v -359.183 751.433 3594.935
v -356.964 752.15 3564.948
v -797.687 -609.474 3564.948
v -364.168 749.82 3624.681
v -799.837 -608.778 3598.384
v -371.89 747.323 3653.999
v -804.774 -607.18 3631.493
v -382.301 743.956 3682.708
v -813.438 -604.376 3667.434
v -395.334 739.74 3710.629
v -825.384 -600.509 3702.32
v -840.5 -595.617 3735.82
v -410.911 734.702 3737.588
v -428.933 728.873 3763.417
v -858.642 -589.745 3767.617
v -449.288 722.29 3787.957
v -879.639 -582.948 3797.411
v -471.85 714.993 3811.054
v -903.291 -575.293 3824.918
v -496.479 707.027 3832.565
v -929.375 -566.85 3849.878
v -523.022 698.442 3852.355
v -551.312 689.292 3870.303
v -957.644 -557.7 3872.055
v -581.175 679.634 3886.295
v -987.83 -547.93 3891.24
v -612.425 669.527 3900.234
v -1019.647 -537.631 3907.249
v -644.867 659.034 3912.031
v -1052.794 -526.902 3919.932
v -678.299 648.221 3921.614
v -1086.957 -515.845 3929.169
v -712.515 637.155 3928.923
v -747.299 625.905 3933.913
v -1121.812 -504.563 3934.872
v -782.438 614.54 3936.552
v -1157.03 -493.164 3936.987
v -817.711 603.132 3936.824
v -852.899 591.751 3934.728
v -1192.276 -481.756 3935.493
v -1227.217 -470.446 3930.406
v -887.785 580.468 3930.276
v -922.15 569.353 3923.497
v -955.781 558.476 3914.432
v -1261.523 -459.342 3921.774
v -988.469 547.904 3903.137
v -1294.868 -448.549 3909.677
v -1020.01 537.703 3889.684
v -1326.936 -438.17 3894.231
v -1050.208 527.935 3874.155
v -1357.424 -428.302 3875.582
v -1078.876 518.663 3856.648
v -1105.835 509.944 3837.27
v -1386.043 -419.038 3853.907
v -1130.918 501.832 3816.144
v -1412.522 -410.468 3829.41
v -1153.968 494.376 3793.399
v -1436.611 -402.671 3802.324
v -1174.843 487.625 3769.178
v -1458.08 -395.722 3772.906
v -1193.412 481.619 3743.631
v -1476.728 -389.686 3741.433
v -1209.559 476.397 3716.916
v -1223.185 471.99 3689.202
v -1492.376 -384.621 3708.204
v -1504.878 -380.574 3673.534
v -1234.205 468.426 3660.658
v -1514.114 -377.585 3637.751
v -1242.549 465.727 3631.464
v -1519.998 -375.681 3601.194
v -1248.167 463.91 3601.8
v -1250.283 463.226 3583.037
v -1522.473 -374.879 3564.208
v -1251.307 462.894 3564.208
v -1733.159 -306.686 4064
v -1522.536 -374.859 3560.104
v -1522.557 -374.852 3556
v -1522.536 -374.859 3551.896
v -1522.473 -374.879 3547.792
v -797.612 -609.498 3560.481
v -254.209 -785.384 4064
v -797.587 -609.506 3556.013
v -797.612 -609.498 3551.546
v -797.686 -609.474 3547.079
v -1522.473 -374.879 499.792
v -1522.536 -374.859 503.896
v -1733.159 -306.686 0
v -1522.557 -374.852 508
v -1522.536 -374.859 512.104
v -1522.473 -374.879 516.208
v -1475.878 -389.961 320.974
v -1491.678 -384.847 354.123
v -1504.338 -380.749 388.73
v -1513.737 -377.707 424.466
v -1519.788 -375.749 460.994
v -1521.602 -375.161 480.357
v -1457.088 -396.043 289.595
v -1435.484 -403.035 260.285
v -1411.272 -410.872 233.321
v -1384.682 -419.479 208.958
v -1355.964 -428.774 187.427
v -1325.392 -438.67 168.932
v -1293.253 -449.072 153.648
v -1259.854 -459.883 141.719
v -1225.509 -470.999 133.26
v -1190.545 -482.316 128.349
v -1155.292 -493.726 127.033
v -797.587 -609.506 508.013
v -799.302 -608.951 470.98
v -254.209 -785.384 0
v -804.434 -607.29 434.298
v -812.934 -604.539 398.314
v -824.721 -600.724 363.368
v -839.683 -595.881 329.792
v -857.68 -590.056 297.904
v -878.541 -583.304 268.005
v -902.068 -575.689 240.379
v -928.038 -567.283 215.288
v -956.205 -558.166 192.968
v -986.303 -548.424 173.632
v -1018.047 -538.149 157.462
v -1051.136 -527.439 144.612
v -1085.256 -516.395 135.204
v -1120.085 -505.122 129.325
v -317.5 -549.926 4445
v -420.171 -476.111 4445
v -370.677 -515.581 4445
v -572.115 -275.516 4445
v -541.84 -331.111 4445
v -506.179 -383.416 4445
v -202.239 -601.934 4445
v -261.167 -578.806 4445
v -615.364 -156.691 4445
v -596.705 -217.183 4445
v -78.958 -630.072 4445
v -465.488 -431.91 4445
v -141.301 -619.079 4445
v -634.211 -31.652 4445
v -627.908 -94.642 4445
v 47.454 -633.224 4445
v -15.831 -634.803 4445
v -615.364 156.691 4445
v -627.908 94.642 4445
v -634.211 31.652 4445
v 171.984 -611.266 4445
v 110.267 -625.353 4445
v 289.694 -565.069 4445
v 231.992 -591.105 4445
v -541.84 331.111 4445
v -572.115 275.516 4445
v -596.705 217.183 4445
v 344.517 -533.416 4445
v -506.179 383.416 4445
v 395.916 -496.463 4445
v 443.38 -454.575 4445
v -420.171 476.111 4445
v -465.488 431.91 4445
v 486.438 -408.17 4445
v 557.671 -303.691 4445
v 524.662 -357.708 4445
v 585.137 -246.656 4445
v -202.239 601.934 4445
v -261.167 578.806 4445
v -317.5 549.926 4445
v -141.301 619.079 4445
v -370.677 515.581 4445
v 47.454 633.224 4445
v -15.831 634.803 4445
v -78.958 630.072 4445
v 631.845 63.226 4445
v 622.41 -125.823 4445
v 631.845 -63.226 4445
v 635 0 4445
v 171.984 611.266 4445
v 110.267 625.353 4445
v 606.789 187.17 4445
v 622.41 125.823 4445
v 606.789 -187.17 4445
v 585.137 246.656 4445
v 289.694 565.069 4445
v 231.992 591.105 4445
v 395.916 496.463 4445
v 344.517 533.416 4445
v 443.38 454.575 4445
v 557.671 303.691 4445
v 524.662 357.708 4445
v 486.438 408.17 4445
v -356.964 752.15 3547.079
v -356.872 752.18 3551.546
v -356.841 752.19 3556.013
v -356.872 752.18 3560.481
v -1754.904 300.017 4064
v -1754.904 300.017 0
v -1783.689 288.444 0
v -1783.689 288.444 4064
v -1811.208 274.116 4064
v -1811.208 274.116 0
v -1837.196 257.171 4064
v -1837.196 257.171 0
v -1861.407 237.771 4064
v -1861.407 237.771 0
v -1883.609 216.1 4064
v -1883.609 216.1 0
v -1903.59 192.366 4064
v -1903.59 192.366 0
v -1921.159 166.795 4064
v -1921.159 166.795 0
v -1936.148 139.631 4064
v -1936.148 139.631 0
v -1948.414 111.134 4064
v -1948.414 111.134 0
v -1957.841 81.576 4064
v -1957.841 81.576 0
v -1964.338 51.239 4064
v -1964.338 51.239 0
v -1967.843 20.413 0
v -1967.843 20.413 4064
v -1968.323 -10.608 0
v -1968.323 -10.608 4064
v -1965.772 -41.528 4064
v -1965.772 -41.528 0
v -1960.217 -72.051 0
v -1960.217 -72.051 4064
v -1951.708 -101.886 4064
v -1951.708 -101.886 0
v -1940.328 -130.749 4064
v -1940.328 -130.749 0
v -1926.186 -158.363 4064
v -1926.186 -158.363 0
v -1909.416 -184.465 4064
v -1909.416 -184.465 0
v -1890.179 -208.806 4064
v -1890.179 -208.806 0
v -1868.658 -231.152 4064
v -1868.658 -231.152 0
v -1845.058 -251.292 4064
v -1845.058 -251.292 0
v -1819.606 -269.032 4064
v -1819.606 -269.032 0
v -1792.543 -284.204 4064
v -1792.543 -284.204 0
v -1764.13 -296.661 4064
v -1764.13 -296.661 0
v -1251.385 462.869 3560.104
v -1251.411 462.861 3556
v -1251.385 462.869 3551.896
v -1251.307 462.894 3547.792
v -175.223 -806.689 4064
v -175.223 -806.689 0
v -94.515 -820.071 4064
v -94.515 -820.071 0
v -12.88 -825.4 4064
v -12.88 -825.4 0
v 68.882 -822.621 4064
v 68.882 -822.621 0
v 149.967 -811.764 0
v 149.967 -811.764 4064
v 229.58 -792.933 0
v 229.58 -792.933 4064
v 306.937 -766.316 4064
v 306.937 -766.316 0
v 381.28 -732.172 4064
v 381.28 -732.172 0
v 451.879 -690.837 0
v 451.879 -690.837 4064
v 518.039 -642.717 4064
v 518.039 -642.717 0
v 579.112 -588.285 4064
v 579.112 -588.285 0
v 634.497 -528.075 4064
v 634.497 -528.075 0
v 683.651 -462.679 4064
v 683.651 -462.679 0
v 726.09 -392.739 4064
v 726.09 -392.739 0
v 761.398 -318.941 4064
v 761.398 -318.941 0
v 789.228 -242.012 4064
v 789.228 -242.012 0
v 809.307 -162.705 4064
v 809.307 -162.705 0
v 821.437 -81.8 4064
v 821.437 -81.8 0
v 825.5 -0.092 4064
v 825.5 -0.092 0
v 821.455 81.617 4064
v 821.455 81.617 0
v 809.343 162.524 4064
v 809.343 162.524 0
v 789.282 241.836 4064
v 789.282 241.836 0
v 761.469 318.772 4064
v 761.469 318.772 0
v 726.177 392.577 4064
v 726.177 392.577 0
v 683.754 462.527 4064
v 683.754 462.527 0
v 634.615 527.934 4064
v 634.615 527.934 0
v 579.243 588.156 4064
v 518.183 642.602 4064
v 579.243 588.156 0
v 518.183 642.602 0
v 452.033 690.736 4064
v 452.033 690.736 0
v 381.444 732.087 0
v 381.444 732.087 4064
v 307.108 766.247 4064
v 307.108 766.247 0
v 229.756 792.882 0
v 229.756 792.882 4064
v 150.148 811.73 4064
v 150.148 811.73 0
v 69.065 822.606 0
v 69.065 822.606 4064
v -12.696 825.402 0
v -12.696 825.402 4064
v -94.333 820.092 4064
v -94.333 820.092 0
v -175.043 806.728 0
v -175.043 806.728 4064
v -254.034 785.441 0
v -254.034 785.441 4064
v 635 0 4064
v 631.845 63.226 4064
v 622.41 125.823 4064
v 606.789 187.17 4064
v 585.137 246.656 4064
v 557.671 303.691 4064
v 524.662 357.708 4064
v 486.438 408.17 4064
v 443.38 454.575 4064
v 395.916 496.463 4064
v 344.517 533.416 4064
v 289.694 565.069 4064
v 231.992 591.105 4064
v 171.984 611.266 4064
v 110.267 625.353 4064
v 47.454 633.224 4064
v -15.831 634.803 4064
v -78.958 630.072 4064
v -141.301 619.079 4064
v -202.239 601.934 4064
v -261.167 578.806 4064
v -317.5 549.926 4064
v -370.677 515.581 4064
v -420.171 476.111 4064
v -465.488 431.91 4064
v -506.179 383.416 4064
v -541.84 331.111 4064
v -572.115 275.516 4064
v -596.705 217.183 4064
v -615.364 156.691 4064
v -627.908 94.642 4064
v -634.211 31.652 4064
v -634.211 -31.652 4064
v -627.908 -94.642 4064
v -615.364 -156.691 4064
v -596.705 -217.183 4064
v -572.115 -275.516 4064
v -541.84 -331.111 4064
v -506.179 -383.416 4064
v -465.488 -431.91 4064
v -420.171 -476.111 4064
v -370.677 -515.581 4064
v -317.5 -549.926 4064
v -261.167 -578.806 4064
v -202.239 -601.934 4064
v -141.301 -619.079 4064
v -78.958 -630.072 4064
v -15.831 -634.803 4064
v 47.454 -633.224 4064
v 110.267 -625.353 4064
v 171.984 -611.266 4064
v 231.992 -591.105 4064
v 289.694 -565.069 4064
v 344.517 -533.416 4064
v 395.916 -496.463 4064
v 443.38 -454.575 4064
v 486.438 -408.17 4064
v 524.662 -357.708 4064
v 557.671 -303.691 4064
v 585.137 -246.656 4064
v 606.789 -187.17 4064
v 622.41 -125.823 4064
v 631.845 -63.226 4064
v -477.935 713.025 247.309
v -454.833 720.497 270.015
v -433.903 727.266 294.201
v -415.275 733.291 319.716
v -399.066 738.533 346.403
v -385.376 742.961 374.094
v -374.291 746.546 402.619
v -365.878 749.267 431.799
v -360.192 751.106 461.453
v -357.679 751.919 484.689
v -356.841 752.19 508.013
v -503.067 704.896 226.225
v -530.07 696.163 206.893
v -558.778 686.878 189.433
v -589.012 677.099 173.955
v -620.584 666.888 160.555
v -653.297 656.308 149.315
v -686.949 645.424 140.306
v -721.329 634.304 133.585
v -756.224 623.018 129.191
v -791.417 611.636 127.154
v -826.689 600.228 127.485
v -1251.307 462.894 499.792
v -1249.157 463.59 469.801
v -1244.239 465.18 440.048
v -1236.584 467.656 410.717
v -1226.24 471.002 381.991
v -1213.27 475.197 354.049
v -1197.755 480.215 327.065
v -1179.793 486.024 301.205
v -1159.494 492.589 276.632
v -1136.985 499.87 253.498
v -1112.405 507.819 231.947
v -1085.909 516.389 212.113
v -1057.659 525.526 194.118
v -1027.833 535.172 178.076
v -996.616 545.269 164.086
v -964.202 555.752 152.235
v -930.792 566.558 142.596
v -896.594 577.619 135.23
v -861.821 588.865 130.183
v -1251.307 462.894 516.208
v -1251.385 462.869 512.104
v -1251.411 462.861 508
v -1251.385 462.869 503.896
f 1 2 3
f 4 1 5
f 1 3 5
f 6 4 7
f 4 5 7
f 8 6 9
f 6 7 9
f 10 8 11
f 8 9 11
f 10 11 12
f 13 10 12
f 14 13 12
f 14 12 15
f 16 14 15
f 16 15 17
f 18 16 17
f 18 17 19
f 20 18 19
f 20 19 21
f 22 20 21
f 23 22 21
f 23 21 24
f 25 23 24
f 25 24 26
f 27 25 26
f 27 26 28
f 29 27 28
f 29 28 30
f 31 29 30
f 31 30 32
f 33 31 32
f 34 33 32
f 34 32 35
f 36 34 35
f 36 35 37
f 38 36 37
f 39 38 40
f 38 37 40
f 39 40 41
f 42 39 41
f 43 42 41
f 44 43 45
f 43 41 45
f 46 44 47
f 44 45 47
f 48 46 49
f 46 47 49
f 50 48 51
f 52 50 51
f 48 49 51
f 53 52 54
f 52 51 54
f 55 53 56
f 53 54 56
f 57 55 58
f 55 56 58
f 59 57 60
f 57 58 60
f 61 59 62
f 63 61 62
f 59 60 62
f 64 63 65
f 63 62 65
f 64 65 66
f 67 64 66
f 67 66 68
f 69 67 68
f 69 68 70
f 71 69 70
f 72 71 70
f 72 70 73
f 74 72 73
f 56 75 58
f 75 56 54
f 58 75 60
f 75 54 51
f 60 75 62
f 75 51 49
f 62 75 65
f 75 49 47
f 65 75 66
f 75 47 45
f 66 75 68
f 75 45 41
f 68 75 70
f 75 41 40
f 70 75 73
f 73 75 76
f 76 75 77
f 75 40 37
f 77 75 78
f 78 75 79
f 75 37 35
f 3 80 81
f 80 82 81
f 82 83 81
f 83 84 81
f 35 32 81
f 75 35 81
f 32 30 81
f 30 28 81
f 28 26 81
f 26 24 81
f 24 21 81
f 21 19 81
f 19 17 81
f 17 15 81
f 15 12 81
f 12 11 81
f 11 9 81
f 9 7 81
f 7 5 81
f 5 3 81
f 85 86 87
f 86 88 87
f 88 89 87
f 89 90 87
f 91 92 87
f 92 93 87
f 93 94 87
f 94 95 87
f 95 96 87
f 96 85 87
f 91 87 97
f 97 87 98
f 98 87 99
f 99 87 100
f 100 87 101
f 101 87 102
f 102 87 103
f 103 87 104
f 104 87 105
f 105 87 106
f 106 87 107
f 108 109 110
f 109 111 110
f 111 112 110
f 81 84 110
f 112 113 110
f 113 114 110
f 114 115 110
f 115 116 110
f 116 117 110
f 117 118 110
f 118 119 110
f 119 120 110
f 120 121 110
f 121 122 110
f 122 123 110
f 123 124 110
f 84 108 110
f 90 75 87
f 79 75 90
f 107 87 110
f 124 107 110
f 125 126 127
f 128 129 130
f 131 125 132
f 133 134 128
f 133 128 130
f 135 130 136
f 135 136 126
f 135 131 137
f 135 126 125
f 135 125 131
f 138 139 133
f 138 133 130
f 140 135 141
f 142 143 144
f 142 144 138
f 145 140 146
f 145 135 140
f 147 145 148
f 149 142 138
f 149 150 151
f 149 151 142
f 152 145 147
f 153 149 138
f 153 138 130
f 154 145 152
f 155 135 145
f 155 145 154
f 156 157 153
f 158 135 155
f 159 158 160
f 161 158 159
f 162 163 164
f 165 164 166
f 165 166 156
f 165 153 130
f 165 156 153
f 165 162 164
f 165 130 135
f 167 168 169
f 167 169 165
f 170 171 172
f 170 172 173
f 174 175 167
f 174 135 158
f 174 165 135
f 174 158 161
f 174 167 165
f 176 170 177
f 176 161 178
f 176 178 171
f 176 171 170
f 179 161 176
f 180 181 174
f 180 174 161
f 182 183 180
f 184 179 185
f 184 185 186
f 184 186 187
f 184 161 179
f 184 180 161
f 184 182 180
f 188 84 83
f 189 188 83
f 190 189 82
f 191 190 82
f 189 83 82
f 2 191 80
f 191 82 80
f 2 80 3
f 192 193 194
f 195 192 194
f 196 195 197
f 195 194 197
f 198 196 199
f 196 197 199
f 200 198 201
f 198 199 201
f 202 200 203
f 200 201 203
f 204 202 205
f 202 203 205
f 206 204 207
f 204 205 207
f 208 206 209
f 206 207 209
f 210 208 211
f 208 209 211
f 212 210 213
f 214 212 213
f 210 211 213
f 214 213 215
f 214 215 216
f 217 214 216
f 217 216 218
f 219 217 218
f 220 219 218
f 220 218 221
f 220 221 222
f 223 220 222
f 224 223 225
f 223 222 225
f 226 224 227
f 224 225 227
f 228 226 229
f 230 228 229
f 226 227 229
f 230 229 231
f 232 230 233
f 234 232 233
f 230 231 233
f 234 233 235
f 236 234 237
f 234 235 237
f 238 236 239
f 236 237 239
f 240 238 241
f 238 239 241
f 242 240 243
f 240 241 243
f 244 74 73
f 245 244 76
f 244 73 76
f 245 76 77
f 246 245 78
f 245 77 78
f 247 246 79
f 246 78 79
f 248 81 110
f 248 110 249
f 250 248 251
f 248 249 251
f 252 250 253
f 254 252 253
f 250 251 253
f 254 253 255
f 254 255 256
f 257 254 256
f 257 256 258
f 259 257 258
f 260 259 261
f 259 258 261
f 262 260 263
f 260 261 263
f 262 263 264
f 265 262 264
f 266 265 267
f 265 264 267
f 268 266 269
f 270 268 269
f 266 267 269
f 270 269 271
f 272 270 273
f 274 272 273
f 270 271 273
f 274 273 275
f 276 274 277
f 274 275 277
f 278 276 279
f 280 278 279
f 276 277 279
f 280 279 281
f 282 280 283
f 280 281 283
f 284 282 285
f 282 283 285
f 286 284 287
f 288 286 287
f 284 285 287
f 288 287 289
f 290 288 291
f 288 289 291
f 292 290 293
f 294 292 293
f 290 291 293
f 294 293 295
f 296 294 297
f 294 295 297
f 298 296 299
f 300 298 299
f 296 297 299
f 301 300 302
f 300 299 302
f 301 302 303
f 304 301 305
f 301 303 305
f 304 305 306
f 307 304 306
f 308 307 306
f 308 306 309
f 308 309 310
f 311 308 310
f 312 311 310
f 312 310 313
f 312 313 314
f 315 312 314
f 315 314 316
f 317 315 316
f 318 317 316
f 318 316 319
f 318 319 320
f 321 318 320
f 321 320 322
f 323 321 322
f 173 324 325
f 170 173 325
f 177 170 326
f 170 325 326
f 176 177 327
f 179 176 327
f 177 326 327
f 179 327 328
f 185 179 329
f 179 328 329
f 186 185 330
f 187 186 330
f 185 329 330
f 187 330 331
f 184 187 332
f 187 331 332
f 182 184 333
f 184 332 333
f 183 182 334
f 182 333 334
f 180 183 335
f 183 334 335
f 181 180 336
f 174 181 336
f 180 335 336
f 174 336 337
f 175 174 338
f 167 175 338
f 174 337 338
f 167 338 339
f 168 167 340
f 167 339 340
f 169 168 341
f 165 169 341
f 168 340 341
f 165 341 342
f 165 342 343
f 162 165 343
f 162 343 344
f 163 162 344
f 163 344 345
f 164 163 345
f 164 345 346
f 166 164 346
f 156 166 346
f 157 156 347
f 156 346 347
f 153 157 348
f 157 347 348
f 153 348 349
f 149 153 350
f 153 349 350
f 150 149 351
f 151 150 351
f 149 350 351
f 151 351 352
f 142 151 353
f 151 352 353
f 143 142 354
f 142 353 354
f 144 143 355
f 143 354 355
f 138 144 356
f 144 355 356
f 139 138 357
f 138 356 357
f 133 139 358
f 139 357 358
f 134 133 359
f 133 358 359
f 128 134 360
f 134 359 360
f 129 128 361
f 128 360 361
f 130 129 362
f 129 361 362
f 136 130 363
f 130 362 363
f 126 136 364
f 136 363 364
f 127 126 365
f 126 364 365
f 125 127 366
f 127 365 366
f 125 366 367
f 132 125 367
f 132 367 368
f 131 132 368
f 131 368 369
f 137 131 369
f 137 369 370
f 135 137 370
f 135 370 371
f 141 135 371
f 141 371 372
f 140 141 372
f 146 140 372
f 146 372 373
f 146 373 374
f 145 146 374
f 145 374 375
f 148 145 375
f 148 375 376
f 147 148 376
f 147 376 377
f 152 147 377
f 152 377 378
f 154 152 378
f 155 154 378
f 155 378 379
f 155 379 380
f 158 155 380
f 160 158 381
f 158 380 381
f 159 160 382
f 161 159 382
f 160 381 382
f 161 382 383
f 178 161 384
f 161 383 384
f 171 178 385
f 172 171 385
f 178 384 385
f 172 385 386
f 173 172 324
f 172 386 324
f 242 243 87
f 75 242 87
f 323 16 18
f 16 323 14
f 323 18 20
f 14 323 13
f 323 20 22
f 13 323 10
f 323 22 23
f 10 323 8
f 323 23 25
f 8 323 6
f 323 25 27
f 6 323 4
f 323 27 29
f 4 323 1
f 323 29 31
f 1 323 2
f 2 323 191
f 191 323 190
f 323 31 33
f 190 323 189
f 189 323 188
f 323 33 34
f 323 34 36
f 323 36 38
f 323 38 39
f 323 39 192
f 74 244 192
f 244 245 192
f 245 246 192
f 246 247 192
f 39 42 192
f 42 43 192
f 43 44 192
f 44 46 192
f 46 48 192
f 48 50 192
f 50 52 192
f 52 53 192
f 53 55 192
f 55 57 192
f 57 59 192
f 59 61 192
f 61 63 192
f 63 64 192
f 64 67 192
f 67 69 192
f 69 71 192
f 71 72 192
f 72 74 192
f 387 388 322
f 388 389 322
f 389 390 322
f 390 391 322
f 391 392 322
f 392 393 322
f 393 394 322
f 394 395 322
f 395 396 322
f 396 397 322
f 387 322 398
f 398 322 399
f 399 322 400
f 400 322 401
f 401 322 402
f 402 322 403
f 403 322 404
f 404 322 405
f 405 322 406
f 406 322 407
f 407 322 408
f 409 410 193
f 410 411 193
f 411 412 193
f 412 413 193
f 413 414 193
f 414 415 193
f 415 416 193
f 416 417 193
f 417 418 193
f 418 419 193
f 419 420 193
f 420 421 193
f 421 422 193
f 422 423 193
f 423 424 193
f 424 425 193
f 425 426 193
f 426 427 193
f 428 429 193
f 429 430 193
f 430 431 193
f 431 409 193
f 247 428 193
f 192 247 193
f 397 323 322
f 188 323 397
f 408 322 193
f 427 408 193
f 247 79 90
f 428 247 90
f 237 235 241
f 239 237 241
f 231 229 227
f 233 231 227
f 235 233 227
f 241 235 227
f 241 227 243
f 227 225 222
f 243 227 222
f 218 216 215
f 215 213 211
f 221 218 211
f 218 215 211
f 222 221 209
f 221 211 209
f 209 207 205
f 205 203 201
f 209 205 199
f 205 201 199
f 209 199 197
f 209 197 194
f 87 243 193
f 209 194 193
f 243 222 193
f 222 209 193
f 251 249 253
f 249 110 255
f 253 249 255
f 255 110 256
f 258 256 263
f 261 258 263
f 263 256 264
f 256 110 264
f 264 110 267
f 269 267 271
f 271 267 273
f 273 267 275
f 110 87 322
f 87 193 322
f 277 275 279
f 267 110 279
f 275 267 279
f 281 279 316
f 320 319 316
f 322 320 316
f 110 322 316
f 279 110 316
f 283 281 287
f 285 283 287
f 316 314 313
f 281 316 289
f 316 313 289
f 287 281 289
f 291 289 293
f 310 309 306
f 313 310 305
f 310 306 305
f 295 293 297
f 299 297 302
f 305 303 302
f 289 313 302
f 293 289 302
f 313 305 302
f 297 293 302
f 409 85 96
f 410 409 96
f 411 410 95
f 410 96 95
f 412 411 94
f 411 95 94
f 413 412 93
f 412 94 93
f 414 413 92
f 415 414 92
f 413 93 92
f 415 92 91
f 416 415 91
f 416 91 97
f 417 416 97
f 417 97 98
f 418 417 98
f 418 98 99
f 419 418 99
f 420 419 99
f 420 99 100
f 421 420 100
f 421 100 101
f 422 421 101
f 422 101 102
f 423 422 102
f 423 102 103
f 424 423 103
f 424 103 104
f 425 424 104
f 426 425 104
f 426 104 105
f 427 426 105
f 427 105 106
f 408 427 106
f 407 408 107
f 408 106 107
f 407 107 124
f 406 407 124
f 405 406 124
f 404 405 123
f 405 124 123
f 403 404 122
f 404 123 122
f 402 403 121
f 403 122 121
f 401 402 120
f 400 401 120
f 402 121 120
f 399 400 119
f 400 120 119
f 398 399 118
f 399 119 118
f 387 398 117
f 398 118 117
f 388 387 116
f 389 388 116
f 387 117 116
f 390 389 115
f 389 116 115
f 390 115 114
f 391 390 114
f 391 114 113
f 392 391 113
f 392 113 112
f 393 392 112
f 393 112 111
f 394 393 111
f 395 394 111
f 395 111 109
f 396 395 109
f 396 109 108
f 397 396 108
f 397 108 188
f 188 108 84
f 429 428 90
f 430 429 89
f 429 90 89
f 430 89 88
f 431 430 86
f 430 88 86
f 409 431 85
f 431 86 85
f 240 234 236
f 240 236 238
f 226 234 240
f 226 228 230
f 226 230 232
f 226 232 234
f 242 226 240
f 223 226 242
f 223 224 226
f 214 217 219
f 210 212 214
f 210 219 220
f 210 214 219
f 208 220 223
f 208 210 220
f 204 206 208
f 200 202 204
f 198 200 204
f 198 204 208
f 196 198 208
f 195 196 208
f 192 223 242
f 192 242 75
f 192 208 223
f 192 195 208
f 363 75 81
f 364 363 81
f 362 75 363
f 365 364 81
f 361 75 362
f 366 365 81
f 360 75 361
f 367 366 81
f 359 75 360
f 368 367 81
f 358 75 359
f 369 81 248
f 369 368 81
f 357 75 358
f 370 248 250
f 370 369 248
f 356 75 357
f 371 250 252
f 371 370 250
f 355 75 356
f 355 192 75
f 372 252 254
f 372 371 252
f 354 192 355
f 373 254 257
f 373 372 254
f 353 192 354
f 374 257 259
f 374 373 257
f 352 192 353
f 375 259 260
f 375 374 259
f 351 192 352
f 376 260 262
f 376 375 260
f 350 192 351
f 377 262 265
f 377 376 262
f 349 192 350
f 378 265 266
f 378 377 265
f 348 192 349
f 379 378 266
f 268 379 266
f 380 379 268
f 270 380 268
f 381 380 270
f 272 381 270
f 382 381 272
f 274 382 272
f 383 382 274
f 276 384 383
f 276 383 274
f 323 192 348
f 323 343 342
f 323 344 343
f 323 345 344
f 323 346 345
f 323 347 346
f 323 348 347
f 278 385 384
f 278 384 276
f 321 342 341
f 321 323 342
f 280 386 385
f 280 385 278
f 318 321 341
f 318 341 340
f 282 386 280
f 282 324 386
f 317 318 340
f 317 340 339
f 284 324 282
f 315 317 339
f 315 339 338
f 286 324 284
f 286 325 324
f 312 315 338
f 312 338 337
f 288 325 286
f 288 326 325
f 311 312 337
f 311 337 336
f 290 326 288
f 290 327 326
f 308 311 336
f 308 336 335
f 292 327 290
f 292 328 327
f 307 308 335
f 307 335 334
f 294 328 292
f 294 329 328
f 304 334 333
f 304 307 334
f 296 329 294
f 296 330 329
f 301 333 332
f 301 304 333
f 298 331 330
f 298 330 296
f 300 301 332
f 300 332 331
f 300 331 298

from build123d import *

# Parameters (mm, degrees)
F1_DEPTH = 4064
F3_DEPTH = 1865.093828
F4_R     = 635
F5_DEPTH = 381


with BuildPart() as f1:
    # F0 (on Top) → F1 (new body)
    with BuildSketch(Plane.XY):
        with BuildLine():
            Line((-1733.158511, -306.68588), (-254.208739, -785.384089))
            ThreePointArc((-254.208739, -785.384089), (825.499995, -0.092015), (-254.033646, 785.44074))
            Line((-254.033646, 785.44074), (-1754.903868, 300.01706))
            ThreePointArc((-1754.903868, 300.01706), (-1968.462055, 4.908515), (-1764.129552, -296.661346))
            Line((-1764.129552, -296.661346), (-1733.158511, -306.68588))
        make_face()
    extrude(amount=F1_DEPTH)

    # F2 (on face) → F3 (cut, through all)
    with BuildSketch(Plane(origin=(-254.208739, -785.384089, 0), x_dir=(0.951404, -0.307945, 0), z_dir=(-0.307945, -0.951404, 0))):
        with BuildLine():
            Line((-571.238176, 3564.947605), (-571.237561, 3547.078581))
            ThreePointArc((-571.237561, 3547.078581), (-571.133096, 3556.013097), (-571.238176, 3564.947605))
        make_face()
        with BuildLine():
            Line((-571.133096, 508.013097), (-571.237561, 3547.078581))
            Line((-571.237561, 3547.078581), (-571.238176, 3564.947605))
            ThreePointArc((-571.238176, 3564.947605), (-952.502915, 3936.999821), (-1333.044669, 3564.208155))
            Line((-1333.044669, 3564.208155), (-1333.044669, 3547.791845))
            Line((-1333.044669, 3547.791845), (-1333.044669, 516.208155))
            Line((-1333.044669, 516.208155), (-1333.044669, 499.791845))
            ThreePointArc((-1333.044669, 499.791845), (-948.022232, 127.022178), (-571.133096, 508.013097))
        make_face()
        with BuildLine():
            Line((-1333.044669, 3547.791845), (-1333.044669, 3564.208155))
            ThreePointArc((-1333.044669, 3564.208155), (-1333.133096, 3556), (-1333.044669, 3547.791845))
        make_face()
        with BuildLine():
            ThreePointArc((-1333.044669, 516.208155), (-1333.133096, 508), (-1333.044669, 499.791845))
            Line((-1333.044669, 499.791845), (-1333.044669, 516.208155))
        make_face()
    extrude(amount=-F3_DEPTH, mode=Mode.SUBTRACT)

    # F4 (on face) → F5 (join)
    with BuildSketch(Plane.XY.offset(4064)):
        Circle(F4_R)
    extrude(amount=F5_DEPTH)


solid = f1.part
